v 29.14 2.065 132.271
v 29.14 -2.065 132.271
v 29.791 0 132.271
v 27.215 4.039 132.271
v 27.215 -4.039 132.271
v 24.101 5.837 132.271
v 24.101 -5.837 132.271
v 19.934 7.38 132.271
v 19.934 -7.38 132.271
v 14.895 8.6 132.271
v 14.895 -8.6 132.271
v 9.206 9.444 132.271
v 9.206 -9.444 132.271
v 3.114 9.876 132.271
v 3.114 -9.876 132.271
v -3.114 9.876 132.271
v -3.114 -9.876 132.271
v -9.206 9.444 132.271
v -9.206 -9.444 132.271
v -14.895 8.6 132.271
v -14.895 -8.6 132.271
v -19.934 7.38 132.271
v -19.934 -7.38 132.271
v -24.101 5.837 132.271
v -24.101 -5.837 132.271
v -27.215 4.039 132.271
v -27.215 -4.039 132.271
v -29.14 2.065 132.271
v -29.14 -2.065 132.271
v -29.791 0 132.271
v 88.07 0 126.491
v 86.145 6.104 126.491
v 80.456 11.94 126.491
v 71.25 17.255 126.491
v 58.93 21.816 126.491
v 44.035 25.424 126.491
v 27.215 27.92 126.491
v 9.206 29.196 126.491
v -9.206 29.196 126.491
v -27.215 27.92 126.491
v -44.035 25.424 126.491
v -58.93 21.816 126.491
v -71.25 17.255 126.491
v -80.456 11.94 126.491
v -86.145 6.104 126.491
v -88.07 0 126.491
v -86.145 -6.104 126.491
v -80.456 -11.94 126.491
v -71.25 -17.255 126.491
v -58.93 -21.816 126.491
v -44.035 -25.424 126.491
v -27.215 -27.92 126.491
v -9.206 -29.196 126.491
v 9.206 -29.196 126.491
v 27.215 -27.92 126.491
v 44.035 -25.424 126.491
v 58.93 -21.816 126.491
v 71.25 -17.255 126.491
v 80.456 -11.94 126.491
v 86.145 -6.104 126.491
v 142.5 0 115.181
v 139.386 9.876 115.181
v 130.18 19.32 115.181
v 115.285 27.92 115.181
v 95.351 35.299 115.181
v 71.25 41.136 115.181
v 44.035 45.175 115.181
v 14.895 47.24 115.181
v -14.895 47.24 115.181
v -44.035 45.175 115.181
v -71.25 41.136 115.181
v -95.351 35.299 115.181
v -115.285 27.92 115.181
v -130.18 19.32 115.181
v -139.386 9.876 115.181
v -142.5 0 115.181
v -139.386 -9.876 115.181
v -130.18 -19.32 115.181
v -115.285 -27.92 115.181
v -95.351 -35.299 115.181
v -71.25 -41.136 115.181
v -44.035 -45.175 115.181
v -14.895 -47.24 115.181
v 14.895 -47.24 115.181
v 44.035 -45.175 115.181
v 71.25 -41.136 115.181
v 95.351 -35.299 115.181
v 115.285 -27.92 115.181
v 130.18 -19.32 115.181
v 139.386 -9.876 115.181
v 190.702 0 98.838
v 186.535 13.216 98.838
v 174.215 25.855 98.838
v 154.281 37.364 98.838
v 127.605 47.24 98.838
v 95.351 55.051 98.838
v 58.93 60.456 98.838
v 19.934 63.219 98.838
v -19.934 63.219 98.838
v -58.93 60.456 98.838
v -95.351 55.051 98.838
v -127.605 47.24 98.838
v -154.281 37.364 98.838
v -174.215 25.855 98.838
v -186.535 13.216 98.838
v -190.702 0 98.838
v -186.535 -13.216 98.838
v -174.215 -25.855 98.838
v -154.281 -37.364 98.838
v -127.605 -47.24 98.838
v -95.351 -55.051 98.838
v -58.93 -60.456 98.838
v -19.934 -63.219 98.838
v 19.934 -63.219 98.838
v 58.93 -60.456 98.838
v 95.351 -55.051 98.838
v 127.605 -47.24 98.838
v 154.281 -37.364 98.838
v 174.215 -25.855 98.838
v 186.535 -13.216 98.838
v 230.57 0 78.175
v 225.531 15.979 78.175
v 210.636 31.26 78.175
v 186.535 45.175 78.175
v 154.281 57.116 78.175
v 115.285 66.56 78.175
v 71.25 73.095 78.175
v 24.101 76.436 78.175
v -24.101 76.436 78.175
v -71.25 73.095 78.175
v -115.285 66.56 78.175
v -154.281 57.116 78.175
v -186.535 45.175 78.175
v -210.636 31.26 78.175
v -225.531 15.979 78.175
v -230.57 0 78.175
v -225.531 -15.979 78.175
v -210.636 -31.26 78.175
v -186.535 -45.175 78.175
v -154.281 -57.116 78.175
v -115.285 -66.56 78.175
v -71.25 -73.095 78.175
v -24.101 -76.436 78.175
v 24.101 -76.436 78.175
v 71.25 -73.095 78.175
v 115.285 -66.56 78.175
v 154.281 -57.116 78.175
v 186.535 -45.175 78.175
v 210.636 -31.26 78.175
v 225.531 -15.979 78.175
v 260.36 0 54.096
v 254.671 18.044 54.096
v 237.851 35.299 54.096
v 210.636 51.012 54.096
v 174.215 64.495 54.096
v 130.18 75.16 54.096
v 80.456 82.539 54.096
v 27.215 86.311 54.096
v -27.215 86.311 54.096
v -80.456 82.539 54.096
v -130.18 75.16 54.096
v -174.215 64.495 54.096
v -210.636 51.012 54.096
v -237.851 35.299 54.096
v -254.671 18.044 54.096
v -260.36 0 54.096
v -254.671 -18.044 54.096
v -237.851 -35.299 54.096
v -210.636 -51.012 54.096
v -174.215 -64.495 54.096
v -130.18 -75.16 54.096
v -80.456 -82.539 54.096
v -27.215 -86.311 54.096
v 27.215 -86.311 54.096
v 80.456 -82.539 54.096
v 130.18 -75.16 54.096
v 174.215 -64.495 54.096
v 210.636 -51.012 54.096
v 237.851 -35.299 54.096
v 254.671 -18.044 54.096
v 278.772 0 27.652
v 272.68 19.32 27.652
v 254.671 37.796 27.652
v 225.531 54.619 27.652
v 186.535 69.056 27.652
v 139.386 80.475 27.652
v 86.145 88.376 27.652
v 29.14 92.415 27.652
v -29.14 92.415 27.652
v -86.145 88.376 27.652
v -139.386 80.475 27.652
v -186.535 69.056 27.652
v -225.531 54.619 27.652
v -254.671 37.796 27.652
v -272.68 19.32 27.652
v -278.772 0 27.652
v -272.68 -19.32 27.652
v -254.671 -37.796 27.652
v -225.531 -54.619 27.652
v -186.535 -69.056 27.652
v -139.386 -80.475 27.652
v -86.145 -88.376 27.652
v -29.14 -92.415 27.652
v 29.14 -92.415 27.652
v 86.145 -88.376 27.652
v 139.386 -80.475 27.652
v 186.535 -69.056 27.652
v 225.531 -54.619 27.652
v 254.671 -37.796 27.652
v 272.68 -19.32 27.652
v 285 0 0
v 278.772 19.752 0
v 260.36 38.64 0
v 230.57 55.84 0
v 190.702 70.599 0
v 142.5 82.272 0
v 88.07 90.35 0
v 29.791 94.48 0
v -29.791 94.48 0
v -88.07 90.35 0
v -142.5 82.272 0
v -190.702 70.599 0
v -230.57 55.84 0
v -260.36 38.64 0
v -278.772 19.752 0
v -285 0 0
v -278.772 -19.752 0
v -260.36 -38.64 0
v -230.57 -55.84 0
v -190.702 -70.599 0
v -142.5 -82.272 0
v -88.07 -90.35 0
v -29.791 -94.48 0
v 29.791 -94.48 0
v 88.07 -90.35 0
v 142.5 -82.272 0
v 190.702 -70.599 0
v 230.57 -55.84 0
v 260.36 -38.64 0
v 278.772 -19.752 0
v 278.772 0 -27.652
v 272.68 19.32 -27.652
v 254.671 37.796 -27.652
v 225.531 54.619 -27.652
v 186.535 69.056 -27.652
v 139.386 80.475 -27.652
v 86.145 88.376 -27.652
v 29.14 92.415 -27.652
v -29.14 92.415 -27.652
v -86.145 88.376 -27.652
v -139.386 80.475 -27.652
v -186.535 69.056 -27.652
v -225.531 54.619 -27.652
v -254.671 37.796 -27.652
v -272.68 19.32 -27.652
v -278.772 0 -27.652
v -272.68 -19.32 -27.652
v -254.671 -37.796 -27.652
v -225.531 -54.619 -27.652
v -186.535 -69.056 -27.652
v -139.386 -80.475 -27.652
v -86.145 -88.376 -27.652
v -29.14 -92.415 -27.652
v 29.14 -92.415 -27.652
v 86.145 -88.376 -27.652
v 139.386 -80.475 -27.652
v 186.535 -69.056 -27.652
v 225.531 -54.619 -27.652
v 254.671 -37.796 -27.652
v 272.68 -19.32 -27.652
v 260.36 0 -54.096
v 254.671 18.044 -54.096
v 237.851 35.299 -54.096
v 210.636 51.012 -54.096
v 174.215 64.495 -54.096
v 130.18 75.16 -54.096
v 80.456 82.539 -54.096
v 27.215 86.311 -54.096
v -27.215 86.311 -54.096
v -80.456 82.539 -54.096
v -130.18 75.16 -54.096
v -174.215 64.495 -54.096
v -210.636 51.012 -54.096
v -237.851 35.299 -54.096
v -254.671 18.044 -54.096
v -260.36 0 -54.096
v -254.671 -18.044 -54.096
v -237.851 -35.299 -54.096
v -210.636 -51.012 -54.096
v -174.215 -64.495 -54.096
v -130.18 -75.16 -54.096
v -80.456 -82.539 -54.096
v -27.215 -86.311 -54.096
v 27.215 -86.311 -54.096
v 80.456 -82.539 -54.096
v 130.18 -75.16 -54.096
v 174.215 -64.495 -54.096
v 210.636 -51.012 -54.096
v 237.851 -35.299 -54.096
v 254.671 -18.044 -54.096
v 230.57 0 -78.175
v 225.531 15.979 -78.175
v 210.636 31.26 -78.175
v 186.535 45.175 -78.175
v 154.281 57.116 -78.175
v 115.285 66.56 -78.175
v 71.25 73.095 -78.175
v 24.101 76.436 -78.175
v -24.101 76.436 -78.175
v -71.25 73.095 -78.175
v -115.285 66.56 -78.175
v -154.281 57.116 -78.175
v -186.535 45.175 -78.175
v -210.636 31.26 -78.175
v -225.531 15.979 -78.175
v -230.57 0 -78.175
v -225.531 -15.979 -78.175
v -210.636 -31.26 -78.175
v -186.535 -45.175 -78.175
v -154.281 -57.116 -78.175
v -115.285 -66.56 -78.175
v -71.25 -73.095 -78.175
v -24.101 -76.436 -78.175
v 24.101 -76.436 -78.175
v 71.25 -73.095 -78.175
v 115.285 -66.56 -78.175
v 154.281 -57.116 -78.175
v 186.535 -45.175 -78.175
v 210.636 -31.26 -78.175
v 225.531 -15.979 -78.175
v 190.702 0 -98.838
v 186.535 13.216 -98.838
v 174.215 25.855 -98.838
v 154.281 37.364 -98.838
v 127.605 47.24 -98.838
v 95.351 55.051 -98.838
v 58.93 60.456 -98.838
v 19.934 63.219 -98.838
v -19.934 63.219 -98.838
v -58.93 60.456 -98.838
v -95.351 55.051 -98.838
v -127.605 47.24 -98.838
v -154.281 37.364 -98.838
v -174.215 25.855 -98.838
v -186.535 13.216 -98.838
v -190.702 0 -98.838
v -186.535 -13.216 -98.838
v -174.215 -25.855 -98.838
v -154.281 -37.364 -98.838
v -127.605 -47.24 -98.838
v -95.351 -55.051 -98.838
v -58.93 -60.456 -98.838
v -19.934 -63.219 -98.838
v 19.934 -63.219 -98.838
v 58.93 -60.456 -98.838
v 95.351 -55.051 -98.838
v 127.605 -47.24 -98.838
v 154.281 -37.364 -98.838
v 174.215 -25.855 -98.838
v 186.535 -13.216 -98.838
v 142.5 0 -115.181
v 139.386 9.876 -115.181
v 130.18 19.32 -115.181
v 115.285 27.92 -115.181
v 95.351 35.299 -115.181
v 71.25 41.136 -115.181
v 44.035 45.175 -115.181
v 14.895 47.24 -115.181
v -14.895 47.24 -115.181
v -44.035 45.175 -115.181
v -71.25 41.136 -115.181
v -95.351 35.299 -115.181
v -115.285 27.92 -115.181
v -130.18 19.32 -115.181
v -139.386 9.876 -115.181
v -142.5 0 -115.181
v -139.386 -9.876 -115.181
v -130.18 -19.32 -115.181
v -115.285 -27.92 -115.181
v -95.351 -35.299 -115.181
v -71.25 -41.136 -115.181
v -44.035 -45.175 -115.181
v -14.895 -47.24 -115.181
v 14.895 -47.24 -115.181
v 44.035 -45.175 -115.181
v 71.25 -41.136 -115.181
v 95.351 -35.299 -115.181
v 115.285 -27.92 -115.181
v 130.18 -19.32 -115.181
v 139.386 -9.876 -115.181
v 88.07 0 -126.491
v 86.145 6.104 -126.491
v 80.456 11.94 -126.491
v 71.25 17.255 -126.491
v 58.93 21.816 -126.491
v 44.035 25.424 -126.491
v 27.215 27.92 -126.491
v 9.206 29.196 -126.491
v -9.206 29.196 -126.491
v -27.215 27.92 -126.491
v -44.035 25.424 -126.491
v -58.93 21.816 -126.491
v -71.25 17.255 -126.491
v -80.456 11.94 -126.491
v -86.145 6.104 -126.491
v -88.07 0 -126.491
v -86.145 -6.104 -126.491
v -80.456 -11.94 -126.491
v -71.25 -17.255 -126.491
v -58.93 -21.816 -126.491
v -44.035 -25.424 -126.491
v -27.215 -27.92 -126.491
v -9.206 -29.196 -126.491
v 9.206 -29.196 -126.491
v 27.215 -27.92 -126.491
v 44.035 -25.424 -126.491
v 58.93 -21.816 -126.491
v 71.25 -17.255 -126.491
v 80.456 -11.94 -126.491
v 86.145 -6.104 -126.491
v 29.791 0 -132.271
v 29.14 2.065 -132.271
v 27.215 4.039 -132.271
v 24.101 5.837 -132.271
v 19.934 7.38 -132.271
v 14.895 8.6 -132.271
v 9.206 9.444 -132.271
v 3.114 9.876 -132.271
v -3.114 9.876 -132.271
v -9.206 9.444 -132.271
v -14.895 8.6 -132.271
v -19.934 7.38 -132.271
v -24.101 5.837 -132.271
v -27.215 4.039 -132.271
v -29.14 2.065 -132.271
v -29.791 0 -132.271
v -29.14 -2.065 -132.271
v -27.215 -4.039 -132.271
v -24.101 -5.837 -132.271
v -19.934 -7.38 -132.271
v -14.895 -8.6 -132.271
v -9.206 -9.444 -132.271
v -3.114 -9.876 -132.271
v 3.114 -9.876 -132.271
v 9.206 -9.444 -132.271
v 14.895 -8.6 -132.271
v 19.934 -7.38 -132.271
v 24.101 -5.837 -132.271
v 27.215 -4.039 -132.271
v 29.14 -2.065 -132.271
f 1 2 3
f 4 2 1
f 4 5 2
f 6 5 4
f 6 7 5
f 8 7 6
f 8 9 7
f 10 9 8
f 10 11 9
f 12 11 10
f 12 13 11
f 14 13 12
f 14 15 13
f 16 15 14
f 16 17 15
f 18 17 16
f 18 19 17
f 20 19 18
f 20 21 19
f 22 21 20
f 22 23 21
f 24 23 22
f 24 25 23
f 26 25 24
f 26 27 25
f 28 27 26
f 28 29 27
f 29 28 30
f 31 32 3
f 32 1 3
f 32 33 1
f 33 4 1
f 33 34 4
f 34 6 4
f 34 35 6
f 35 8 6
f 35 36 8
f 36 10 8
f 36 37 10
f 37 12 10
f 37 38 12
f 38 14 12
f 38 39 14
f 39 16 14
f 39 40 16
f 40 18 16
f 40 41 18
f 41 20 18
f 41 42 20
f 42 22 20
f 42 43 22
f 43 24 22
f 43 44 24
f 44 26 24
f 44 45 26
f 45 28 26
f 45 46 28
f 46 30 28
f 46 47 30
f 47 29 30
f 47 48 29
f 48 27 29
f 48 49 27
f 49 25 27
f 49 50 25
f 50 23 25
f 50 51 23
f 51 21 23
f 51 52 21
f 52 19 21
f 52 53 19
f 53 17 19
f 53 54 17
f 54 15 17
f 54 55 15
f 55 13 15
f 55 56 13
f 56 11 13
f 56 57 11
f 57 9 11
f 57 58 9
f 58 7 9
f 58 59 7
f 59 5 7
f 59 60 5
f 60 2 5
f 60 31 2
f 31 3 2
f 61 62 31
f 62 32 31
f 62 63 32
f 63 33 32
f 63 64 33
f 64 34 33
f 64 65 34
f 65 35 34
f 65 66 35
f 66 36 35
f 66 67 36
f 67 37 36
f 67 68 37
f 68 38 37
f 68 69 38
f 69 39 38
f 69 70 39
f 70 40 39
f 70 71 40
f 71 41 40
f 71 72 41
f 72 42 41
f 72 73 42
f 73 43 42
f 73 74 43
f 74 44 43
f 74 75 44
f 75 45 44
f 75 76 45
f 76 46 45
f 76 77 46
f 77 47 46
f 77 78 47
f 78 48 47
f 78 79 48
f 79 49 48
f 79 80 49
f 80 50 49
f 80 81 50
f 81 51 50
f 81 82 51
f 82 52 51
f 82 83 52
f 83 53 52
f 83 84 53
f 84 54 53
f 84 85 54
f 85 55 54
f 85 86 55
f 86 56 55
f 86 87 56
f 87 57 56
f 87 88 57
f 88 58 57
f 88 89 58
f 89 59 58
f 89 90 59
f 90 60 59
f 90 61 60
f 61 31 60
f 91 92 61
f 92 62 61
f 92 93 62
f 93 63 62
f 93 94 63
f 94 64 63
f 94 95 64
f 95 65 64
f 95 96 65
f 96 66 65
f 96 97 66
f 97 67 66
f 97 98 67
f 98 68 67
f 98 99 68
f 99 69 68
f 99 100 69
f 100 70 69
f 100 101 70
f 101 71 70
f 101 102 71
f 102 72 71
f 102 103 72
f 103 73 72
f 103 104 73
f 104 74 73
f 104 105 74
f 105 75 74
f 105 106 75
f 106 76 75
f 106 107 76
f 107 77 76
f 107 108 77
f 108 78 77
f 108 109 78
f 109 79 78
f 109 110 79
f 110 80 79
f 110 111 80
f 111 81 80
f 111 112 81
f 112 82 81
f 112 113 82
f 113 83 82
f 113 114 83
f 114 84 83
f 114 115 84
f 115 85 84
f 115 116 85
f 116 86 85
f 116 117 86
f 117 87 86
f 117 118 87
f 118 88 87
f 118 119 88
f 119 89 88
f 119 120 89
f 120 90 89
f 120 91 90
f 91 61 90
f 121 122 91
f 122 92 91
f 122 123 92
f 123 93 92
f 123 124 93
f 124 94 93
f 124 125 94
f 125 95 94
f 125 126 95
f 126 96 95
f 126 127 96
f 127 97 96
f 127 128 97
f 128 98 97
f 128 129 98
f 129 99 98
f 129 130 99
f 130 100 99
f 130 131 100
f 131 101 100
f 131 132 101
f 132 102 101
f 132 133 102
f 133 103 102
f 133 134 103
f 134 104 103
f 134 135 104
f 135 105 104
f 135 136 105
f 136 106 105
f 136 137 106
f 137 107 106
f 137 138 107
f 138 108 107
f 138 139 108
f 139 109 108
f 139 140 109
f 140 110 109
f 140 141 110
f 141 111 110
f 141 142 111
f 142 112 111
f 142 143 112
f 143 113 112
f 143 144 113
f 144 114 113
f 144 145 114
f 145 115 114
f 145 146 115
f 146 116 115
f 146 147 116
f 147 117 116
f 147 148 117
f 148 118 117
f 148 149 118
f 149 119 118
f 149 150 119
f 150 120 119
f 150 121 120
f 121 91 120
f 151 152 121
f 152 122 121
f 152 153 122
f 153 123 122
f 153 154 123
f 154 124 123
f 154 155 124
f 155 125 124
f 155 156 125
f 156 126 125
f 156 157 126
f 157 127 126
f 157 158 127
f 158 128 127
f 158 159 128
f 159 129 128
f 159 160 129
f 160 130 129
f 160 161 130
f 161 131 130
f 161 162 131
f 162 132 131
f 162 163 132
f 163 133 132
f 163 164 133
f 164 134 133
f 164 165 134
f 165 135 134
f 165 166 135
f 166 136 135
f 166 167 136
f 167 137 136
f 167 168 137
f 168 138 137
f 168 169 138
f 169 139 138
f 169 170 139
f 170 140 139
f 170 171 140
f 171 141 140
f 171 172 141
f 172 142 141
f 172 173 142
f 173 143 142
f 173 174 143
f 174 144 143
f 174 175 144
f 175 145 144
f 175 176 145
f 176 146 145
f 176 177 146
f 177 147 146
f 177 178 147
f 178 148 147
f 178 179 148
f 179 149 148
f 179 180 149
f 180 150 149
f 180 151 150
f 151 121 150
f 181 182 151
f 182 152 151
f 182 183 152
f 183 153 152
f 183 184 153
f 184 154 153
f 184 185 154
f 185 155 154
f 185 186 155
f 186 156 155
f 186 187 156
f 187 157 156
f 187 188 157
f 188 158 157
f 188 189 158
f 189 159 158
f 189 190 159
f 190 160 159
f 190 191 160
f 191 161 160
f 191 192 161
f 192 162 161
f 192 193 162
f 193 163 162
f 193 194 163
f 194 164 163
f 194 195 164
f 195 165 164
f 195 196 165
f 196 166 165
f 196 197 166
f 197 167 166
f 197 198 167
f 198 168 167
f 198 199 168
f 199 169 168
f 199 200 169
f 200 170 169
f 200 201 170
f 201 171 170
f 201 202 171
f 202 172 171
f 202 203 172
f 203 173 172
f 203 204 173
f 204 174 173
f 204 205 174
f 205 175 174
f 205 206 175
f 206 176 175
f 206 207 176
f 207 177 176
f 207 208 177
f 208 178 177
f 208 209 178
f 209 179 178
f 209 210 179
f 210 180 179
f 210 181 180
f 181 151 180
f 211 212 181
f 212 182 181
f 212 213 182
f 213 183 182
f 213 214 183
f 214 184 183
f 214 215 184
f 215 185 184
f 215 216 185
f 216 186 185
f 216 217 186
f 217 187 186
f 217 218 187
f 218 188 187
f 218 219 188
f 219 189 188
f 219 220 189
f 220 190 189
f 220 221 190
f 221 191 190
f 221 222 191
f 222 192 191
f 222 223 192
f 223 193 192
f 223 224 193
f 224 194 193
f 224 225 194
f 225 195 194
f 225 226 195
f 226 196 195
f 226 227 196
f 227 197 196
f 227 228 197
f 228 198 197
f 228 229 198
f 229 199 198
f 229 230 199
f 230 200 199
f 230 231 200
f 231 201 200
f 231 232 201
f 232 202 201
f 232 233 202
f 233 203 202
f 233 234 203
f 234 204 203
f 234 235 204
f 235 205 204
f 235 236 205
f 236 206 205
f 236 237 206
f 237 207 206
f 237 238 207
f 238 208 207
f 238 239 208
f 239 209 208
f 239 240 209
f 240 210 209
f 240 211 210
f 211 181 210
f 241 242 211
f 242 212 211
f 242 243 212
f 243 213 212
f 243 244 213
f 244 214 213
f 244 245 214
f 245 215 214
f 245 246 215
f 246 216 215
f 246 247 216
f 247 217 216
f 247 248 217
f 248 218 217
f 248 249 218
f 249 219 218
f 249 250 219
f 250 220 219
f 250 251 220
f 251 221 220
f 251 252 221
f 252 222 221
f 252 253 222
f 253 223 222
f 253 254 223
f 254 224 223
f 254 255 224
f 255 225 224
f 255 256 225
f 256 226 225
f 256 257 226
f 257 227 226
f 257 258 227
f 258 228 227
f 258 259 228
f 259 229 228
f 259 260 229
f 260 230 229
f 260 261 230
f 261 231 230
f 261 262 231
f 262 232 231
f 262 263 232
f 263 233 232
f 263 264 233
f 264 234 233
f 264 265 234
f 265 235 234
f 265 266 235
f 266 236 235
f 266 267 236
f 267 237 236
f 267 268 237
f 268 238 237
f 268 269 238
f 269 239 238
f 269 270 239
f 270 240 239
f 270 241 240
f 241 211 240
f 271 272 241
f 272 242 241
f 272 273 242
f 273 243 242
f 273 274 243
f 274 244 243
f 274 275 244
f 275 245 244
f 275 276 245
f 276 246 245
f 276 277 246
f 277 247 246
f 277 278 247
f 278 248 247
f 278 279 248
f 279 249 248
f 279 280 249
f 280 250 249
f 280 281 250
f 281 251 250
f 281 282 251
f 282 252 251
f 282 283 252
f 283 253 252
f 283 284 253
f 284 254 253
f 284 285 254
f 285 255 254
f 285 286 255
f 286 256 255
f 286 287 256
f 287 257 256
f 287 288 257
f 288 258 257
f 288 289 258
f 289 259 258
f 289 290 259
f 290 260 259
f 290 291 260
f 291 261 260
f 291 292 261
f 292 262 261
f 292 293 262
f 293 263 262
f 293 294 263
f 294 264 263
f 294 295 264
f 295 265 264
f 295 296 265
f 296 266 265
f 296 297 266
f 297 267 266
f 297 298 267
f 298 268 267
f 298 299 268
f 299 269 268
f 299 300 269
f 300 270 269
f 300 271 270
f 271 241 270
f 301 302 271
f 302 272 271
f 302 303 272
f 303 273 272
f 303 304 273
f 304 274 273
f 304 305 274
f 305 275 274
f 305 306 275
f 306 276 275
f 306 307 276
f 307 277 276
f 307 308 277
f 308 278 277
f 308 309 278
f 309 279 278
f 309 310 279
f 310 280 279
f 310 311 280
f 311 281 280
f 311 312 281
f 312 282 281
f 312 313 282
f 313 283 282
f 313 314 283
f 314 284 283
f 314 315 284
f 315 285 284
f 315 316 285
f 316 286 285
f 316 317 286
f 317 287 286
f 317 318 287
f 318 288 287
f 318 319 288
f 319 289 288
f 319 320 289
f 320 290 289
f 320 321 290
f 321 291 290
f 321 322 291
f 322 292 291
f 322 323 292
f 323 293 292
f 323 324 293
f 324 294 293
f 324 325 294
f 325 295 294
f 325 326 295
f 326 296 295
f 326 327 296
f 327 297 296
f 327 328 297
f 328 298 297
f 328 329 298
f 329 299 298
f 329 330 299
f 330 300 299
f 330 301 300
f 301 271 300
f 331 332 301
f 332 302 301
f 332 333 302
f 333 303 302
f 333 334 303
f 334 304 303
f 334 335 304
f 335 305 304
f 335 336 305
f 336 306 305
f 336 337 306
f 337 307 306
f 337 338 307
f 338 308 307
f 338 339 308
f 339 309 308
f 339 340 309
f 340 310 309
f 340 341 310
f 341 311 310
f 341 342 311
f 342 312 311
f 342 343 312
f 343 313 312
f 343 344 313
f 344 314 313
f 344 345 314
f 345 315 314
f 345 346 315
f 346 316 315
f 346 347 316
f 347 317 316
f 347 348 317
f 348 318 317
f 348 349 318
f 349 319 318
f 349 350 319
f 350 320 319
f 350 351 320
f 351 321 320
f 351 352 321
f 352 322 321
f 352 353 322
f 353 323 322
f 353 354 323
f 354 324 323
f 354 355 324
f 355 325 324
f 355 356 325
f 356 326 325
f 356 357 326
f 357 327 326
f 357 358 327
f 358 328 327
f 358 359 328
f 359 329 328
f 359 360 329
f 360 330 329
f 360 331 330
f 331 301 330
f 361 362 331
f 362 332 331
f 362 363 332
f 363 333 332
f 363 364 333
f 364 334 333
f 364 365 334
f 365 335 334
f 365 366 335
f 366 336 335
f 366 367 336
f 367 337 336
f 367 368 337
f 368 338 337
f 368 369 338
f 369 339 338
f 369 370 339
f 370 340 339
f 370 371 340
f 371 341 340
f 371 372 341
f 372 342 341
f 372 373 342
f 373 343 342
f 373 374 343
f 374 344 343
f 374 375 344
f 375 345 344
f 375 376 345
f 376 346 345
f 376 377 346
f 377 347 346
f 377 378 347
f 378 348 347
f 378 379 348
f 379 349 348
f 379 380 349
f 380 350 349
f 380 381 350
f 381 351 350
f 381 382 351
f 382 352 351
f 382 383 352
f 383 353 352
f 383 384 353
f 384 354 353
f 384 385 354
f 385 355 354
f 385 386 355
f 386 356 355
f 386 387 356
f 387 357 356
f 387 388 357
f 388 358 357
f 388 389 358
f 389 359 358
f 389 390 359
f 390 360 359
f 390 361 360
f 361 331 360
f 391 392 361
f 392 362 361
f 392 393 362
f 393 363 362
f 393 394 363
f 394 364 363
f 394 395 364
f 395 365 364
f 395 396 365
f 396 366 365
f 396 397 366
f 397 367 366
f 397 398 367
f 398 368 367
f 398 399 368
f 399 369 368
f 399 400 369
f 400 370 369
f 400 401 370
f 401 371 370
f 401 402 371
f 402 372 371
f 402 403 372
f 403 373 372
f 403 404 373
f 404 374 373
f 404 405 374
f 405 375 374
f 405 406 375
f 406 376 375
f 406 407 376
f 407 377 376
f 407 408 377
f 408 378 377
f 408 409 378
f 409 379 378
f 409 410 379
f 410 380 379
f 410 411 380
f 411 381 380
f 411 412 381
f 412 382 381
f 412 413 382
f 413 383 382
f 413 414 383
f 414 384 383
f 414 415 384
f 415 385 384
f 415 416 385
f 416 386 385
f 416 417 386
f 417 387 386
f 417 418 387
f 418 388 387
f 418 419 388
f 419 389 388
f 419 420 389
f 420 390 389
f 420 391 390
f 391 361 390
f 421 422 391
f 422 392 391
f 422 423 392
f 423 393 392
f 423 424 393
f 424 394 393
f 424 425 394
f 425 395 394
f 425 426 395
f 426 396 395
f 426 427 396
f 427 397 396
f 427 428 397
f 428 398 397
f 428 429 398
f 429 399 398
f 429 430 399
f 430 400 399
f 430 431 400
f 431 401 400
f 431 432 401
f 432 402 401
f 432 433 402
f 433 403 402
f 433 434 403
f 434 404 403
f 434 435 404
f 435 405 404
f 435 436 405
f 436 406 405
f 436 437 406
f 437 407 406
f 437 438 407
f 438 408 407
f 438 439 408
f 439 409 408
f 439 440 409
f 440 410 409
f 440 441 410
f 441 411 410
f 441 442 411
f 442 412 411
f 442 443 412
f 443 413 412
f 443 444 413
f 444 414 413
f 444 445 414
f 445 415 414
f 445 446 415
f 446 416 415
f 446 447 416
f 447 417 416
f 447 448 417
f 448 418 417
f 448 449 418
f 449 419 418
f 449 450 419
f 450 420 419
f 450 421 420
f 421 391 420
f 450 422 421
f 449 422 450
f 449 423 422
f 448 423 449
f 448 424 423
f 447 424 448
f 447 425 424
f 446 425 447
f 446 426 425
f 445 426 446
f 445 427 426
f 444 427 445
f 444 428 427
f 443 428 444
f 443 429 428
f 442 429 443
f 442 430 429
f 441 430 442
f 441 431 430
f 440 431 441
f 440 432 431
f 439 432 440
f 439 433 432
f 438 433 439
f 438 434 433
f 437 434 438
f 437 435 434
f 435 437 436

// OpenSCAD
// Generated by SolidPython 1.0.1 on 2020-07-29 00:46:51


scale(v = [15, 5, 7]) {
	sphere(r = 19);
}
/***********************************************
*********      SolidPython code:      **********
************************************************
 
# import packages: SolidPython
from solid import *
from solid.utils import *
from itertools import chain, combinations, permutations


class Resize:

    def __init__(self, scad_file):
        self.scad_file = scad_file
        #self.scad_file = import_scad(scad_file)
        # cone/cylinder param:
        self.r1 = 0
        self.r2 = 0
        self.h = 0
        # rectangular prism param:
        self.w = 0
        self.l = 0
        # ellipse param:
        self.r = 0

    # import OpenScad code (file name corresponds to shape)


    # classify shape + parameters
    def assign(self, param1, param2, param3):
        if self.scad_file == 'cone.scad':
            self.r1 = param1
            self.r2 = param2
            self.h = param3
        elif self.scad_file == 'cylinder.scad':
            self.r1 = param1
            self.r2 = param2
            self.h = param3
        elif self.scad_file == 'rectangularPrism.scad':
            self.h = param1
            self.l = param2
            self.w = param3
        else:
            self.r = param1
            self.h = param2

    # resize parameters
    def iterate(self):
        x = range(3, 20, 2)
        i = 1
        if self.scad_file == 'cone.scad':
            tempList = list(permutations(x, 2))
            for temp in tempList:
                param1 = temp[0]
                param2 = temp[1]
                filepath = 'produced_scad_files/' + 'cone' + str(param1) + '_' + str(param2) + '_' + '.scad'
                scad_render_to_file(cylinder(h=param1, r1=param2, r2=0), filepath)

        elif self.scad_file == 'cylinder.scad':
            tempList = list(permutations(x, 3))
            for temp in tempList:
                param1 = temp[0]
                param2 = temp[1]
                filepath = 'produced_scad_files/' + 'cylinder' + str(param1) + '_' + str(param2) + '_' + '.scad'
                scad_render_to_file(cylinder(h=param1, r1=param2, r2=param2), filepath)

        elif self.scad_file == 'rectangularPrism.scad':
            tempList = list(permutations(x, 3))
            for temp in tempList:
                param1 = temp[0]
                param2 = temp[1]
                param3 = temp[2]
                filepath = 'produced_scad_files/' + 'rectangularPrism' + str(param1) + '_' + str(param2) + '_' + str(
                    param3) + '.scad'
                scad_render_to_file(cube(size=(param1, param2, param3)), filepath)

        elif self.scad_file == 'ellipse.scad':
            tempList = list(permutations(x, 4))
            for temp in tempList:
                param1 = temp[0]
                param2 = temp[1]
                param3 = temp[2]
                param4 = temp[3]
                filepath = 'produced_scad_files/' + 'ellipse' + str(param1) + '_' + str(param2) + '_' + str(param3) + '_' + str(param4) + '.scad'
                scad_render_to_file(scale([param1, param2, param3])(sphere(r=param4)), filepath)

    def render_to_scadfile(self):
        scad_render_to_file(scad, 'example.scad') 
 
************************************************/
